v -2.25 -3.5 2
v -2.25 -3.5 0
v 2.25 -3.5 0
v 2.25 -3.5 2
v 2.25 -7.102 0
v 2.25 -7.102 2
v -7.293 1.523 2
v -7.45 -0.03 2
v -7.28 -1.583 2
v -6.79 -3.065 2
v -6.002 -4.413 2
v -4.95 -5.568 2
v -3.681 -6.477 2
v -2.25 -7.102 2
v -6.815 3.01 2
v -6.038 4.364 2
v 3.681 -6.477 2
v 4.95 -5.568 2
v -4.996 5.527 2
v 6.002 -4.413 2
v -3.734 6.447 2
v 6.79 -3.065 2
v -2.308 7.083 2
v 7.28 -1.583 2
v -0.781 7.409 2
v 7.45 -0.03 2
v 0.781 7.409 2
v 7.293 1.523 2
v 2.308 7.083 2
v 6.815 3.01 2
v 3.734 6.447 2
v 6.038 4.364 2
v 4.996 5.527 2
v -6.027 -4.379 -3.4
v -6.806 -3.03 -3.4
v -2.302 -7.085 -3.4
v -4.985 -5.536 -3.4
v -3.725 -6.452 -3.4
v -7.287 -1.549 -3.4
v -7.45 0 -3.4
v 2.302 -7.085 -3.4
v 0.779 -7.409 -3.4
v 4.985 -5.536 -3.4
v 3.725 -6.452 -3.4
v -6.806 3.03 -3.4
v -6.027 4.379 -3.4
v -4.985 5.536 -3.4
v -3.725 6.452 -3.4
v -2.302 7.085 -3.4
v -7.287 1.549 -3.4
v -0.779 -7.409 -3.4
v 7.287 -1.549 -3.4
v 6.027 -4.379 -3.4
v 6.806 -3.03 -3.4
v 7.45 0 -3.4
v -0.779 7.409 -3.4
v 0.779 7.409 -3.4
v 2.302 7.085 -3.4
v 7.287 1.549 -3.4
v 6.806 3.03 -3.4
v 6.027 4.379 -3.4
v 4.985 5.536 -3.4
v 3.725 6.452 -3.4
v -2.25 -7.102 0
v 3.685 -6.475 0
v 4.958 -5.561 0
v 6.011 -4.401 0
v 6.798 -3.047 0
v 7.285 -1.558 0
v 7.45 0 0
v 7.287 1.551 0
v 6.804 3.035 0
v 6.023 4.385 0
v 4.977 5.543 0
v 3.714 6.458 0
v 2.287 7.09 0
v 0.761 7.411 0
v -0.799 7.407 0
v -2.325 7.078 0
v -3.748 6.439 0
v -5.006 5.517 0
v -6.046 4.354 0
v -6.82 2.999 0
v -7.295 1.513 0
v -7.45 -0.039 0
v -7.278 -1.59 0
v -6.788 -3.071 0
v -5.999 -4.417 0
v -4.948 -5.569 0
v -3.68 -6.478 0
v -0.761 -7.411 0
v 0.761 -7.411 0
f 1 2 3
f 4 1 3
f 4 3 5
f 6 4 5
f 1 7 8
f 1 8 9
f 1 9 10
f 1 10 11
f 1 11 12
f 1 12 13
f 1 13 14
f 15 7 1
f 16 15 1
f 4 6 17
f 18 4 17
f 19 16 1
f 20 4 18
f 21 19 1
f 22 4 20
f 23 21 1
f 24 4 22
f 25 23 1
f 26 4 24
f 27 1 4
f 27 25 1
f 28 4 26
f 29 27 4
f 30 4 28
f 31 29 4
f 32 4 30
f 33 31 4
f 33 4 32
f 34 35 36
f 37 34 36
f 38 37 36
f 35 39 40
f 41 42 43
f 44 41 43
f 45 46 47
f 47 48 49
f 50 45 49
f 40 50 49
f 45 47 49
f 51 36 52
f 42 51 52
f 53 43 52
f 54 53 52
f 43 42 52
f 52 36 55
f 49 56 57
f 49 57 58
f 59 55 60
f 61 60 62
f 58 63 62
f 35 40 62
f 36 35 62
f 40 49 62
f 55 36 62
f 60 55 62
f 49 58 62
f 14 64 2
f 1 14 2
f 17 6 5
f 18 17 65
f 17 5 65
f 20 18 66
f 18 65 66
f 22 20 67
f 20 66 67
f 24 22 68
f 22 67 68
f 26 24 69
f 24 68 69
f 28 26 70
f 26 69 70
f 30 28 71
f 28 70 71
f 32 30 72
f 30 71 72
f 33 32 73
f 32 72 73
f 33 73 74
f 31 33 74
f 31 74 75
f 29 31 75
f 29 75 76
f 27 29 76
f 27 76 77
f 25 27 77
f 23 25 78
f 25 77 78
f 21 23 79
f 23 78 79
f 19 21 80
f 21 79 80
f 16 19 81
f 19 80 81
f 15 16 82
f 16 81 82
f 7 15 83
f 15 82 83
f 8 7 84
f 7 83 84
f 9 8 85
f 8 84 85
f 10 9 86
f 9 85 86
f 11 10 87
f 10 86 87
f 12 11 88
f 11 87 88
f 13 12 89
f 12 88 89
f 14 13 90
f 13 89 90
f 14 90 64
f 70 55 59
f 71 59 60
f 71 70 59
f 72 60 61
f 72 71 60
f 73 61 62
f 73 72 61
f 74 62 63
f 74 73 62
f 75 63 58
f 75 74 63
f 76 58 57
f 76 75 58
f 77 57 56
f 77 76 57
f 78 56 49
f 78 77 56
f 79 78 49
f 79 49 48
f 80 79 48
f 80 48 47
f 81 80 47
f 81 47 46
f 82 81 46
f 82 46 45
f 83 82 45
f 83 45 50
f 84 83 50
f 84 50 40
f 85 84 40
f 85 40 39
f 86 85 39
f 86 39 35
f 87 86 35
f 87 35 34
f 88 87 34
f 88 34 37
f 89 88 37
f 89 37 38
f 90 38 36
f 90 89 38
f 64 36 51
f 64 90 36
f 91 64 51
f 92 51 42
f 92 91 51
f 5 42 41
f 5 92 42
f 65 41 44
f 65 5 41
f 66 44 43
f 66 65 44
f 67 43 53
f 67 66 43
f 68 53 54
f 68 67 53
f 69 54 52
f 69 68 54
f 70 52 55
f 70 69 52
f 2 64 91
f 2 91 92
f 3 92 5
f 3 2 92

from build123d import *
from build123d import SkipClean  # not in build123d's __all__

# Parameters (mm, degrees)
F1_R     = 7.45
F2_DEPTH = 3.4
F3_DEPTH = 2


with BuildPart() as f2:
    # F1 (on Top) → F2 (new body)
    with BuildSketch(Plane.XY):
        Circle(F1_R)
    extrude(amount=-F2_DEPTH)

    # F0 (on Top) → F3 (join)
    with BuildSketch(Plane.XY):
        with BuildLine():
            Line((2.25, -6.5), (2.25, -7.1021123618))
            ThreePointArc((2.25, -7.1021123618), (0, 7.45), (-2.25, -7.1021123618))
            Line((-2.25, -7.1021123618), (-2.25, -6.5))
            Line((-2.25, -6.5), (-2.25, -3.5))
            Line((-2.25, -3.5), (2.25, -3.5))
            Line((2.25, -3.5), (2.25, -6.5))
        make_face()
    with SkipClean():  # cleaning this boolean's faces spoils the solid; the shape is the same uncleaned
        extrude(amount=F3_DEPTH)


solid = f2.part
